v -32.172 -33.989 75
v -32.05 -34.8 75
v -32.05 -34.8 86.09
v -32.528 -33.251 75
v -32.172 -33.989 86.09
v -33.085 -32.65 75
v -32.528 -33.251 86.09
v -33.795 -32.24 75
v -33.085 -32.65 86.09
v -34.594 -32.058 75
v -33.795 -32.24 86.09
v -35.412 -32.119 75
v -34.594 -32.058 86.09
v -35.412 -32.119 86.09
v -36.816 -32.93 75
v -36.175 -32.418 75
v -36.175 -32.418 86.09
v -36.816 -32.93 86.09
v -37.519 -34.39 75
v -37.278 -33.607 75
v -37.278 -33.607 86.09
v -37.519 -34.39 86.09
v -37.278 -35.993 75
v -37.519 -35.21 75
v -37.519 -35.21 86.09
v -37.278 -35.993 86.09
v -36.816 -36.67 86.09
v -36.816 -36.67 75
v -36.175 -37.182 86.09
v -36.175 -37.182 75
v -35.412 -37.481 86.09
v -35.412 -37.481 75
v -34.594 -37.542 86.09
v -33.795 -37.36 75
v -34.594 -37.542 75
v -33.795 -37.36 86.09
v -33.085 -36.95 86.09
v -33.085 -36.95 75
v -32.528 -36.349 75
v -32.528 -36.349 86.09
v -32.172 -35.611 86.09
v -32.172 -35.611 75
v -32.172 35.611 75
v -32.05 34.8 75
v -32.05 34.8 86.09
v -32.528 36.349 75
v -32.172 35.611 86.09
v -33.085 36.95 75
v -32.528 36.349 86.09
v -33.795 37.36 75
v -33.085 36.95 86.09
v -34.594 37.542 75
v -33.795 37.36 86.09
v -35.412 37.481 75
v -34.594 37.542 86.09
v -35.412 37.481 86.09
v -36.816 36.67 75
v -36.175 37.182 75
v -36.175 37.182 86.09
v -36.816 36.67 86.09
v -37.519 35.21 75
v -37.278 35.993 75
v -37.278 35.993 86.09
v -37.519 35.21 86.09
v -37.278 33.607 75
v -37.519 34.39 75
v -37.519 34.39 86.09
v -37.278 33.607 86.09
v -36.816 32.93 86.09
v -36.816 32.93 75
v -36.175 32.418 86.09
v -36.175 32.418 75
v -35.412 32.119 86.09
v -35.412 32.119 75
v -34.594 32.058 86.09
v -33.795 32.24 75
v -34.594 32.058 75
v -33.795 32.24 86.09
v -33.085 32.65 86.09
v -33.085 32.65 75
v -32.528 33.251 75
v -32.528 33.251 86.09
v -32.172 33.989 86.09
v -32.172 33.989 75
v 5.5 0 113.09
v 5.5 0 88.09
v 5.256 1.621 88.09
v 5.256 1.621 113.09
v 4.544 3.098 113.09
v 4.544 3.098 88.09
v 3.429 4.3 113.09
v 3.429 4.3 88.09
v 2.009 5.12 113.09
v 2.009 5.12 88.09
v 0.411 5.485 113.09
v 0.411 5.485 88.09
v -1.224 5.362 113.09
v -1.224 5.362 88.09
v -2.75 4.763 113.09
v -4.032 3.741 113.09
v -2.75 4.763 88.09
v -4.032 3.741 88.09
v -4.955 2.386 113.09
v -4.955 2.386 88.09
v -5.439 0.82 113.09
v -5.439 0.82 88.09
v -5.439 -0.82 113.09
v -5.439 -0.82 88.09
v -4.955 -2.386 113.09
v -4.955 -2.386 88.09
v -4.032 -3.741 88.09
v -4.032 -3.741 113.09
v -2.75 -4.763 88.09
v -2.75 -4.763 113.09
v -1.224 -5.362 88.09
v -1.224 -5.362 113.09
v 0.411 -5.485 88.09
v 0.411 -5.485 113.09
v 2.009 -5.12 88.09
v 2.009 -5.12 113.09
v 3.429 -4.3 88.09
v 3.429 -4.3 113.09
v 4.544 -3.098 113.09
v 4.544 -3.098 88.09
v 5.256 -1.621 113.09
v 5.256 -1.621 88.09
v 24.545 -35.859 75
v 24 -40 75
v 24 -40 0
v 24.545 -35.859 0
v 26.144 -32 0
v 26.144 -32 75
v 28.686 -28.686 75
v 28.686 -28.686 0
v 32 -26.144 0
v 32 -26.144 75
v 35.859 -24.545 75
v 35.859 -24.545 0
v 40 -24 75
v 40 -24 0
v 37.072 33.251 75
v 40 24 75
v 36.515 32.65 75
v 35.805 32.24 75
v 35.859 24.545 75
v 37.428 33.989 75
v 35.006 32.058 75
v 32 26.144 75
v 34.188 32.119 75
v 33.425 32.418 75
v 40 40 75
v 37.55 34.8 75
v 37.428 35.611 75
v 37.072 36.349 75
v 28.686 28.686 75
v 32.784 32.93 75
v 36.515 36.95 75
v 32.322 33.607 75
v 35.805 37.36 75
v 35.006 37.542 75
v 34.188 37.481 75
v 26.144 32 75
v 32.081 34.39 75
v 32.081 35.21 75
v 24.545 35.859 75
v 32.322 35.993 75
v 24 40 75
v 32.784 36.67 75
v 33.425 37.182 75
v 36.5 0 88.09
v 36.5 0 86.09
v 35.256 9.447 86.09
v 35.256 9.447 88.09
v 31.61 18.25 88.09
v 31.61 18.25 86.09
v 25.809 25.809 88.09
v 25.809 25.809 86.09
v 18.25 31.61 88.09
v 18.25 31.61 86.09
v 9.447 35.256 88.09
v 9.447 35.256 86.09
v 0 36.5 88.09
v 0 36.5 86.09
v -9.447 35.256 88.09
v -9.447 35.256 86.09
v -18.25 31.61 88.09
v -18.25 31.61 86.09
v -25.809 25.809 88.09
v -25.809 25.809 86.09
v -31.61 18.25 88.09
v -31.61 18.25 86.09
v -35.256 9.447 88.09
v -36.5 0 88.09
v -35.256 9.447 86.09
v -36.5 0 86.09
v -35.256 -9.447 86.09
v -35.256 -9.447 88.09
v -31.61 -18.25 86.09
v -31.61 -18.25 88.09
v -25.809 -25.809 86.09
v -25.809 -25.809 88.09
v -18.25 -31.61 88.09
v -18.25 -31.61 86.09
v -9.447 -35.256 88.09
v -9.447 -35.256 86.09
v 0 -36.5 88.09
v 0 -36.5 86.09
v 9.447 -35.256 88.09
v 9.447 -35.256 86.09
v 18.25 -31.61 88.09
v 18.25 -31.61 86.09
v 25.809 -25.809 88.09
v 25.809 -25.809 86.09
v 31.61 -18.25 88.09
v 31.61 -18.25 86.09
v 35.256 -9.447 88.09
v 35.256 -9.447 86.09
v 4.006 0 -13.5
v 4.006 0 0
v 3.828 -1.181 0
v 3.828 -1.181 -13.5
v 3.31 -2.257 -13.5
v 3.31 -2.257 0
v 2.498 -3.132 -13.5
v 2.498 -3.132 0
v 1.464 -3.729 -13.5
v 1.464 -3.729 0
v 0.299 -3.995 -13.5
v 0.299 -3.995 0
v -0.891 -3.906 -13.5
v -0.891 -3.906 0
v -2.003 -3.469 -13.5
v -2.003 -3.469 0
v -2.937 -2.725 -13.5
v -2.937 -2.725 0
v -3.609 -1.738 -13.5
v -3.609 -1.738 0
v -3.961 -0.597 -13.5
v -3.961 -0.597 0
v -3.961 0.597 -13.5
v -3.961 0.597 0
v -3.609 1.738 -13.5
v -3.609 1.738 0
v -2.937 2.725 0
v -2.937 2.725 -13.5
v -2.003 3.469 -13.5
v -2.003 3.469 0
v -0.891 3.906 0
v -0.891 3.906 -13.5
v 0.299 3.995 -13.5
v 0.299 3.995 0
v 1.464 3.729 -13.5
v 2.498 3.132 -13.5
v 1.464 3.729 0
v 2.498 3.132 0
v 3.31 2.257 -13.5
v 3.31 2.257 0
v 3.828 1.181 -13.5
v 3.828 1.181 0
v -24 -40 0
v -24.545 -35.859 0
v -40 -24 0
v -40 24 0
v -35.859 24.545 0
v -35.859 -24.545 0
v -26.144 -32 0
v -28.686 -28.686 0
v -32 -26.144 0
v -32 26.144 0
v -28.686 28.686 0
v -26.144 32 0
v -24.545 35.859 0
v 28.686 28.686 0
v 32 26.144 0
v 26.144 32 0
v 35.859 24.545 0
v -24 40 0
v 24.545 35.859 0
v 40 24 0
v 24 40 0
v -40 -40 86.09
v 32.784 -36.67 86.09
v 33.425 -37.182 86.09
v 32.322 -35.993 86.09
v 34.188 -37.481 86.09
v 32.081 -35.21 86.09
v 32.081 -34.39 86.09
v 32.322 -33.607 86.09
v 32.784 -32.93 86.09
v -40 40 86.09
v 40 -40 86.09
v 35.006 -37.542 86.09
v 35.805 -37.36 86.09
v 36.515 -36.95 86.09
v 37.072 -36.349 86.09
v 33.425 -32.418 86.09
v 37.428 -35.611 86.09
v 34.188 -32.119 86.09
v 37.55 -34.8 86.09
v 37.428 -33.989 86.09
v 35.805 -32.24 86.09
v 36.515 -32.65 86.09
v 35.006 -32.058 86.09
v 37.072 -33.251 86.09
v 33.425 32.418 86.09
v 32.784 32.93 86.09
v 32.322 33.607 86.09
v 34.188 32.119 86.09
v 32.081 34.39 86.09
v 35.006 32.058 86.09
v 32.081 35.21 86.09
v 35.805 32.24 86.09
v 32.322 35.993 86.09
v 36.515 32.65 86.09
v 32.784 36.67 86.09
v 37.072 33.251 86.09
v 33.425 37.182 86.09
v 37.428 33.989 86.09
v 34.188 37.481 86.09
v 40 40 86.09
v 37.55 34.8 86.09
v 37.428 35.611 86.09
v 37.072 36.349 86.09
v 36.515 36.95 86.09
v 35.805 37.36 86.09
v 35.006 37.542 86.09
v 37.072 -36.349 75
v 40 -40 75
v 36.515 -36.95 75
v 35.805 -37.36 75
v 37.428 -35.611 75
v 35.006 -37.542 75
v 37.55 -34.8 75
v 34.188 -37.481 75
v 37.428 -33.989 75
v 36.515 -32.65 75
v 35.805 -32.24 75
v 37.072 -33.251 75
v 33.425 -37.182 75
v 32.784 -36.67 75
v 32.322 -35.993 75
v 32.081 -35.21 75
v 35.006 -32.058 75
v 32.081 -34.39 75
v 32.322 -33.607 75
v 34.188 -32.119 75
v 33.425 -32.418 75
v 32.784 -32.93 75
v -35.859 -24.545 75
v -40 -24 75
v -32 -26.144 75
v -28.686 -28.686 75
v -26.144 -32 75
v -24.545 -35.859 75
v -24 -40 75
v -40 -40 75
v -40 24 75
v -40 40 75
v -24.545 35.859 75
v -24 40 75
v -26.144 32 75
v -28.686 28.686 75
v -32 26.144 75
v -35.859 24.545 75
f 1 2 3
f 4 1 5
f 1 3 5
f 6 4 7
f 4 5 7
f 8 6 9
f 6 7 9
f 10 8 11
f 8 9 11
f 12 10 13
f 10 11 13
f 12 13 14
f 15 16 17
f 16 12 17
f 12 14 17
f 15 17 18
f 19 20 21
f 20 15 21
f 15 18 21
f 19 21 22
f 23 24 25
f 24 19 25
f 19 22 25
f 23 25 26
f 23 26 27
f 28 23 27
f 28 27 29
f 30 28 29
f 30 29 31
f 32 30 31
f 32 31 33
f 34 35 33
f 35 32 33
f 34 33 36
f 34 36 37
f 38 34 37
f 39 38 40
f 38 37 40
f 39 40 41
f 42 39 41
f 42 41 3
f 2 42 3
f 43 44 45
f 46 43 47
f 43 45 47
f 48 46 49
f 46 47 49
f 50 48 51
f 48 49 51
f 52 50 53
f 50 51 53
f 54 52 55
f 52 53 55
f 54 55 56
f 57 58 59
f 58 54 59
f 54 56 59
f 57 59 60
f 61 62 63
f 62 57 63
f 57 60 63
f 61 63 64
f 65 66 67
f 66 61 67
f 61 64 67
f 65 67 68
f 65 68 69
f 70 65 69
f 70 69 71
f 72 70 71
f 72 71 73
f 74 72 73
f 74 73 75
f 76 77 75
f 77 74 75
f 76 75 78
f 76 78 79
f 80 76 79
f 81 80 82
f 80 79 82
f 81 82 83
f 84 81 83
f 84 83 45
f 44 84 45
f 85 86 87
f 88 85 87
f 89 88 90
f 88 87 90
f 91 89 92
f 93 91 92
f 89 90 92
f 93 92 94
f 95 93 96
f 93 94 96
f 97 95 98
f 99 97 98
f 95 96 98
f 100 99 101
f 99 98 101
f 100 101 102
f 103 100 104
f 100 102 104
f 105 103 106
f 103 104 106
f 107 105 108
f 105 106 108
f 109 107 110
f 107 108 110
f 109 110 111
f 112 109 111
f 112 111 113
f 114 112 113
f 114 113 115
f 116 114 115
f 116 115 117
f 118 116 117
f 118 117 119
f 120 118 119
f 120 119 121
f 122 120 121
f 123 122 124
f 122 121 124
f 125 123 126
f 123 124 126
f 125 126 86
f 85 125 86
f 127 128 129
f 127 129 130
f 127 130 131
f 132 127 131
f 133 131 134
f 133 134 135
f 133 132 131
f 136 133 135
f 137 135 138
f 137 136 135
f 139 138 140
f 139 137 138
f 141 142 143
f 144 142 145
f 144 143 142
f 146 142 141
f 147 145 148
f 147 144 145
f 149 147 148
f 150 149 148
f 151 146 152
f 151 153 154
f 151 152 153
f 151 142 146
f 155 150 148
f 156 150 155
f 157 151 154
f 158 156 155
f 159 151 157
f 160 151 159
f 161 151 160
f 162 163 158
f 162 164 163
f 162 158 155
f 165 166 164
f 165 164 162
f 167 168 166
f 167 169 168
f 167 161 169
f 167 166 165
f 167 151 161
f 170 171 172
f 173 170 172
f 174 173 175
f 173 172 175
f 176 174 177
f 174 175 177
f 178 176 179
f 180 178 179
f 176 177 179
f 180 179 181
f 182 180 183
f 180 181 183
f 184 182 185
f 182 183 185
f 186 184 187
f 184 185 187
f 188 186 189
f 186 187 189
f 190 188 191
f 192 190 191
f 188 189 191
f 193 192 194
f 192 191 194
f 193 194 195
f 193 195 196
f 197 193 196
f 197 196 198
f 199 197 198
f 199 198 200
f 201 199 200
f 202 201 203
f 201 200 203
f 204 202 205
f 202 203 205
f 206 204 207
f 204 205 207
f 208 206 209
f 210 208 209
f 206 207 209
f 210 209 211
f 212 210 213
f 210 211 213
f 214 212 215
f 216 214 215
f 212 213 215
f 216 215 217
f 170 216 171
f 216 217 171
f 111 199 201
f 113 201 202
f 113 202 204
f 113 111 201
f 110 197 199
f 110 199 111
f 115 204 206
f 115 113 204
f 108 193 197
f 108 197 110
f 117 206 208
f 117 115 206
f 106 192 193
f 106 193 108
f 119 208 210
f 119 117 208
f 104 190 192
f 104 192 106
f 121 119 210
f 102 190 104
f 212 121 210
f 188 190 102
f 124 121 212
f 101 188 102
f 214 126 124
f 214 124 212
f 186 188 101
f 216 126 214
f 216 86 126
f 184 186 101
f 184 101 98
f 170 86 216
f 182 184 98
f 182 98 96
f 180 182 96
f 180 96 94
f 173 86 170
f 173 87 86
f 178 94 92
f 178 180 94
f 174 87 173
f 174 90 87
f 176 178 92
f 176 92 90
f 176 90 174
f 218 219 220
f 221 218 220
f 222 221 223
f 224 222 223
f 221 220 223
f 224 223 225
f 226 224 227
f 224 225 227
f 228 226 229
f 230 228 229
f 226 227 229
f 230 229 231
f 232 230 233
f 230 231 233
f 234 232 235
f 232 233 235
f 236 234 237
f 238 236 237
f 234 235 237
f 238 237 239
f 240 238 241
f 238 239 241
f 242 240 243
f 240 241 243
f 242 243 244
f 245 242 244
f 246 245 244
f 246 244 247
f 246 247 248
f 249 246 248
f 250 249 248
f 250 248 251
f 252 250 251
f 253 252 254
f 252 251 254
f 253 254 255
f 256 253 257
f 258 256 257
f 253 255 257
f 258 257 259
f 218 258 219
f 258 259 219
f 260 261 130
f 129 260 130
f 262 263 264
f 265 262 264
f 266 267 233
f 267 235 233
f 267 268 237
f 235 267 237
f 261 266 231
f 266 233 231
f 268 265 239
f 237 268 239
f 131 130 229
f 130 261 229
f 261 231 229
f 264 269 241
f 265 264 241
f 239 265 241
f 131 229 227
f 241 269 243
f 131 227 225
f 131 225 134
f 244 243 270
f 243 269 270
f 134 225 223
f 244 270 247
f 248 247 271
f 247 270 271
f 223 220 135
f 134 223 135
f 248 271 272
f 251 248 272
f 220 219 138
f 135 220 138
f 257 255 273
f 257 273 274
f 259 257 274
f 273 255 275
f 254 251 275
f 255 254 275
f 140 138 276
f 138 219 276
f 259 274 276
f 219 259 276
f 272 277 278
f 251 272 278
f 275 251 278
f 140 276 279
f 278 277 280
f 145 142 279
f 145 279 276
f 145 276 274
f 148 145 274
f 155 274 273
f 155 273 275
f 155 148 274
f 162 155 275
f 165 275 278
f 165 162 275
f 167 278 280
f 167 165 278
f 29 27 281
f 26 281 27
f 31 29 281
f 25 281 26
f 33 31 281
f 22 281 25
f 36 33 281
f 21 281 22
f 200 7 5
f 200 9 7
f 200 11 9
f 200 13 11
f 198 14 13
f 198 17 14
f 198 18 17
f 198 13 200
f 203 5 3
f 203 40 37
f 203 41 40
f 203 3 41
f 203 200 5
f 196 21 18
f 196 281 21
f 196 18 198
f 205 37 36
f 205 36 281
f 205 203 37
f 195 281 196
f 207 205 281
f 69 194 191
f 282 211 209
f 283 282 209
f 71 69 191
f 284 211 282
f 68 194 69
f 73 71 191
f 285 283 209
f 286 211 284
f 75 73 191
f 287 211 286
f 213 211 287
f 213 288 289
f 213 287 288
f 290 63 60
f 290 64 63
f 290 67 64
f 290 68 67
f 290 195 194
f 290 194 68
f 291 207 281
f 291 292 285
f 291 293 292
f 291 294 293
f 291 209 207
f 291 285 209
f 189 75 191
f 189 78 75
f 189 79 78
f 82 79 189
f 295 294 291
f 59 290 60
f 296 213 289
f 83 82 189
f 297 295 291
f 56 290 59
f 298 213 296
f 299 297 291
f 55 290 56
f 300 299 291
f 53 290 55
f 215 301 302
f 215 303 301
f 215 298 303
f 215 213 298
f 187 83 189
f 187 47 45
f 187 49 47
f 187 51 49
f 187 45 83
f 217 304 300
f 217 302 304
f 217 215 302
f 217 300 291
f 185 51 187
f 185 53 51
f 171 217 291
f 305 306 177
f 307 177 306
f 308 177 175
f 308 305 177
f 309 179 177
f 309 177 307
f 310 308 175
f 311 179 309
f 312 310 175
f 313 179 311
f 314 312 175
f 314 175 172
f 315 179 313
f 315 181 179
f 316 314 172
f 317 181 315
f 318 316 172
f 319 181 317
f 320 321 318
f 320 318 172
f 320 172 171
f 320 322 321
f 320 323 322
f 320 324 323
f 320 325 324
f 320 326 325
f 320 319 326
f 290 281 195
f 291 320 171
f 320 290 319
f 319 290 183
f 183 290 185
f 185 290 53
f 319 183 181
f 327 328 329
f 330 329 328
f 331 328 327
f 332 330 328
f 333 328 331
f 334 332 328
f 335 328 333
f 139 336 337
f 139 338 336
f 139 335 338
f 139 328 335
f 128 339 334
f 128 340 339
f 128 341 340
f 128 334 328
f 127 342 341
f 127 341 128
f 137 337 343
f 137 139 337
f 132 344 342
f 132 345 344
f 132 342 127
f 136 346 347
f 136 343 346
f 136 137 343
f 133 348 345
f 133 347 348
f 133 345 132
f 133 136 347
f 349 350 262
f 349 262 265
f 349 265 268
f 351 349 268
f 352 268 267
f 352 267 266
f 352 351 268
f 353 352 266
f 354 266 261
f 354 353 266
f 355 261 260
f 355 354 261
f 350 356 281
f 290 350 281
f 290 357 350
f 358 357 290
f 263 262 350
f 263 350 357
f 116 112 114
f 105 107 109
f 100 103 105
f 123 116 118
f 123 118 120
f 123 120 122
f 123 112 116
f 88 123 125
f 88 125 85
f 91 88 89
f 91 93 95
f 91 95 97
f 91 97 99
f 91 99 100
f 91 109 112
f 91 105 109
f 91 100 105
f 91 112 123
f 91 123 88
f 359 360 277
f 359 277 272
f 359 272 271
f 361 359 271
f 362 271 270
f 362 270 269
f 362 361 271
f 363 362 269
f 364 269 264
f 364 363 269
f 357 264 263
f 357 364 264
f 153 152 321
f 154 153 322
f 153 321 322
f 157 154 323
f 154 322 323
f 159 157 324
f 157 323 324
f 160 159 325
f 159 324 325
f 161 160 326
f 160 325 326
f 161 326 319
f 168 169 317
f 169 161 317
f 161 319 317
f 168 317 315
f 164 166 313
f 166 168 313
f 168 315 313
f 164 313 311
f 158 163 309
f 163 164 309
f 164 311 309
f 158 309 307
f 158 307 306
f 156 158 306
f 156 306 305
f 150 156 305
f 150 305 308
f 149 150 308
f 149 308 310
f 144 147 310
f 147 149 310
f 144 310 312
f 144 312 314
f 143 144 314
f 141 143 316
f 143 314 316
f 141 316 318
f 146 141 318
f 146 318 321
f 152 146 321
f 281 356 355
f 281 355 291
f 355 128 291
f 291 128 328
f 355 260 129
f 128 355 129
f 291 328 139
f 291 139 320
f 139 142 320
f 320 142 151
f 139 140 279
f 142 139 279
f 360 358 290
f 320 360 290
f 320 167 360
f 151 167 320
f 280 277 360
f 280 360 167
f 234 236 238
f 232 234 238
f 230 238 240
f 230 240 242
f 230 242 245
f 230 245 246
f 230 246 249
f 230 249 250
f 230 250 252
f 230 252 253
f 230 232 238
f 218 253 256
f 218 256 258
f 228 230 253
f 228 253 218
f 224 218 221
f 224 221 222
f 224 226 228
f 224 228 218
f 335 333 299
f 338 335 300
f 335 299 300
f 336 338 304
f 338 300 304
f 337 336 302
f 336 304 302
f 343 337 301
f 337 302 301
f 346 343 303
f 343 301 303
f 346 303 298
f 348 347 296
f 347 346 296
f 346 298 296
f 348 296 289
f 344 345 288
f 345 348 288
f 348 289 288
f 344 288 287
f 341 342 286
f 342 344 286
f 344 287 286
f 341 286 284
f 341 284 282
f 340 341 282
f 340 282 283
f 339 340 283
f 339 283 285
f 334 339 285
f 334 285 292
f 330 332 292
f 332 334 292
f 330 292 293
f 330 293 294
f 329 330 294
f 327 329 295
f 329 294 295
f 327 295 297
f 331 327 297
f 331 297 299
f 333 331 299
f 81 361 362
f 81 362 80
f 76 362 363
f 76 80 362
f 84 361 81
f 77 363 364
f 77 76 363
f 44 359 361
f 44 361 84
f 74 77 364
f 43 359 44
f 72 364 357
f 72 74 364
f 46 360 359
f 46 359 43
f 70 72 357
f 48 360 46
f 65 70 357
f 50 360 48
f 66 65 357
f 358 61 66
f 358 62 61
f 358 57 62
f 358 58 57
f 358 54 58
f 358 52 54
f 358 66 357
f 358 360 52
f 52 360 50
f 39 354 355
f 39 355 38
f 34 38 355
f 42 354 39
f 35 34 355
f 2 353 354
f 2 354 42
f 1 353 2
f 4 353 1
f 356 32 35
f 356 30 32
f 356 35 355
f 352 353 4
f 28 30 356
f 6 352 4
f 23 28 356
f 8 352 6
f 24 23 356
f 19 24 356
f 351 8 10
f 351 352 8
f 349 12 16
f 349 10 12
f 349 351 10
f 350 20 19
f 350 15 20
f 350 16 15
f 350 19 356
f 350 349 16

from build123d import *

# Parameters (mm, degrees)
SKETCH2_W           = 80
SKETCH2_H           = 80
BOSS_EXTRUDE1_DEPTH = 86.09
SKETCH3_R           = 2.75
CUT_EXTRUDE1_DEPTH  = 104.012077447
SKETCH4_R           = 36.5
BOSS_EXTRUDE2_DEPTH = 2
SKETCH5_R           = 5.5
BOSS_EXTRUDE3_DEPTH = 25
CUT_EXTRUDE2_START  = -75
SKETCH6_R           = 2.75
CUT_EXTRUDE2_DEPTH  = 75
SKETCH7_R           = 4.006
BOSS_EXTRUDE4_DEPTH = 13.5


with BuildPart() as part:
    # Sketch2 → Boss-Extrude1 (new body)
    with BuildSketch(Plane.XY):
        Rectangle(SKETCH2_W, SKETCH2_H)
    extrude(amount=BOSS_EXTRUDE1_DEPTH)

    # Sketch3 → Cut-Extrude1 (cut, through all)
    with BuildSketch(Plane.XY.offset(86.09)):
        with Locations((-34.8, 34.8)):
            Circle(SKETCH3_R)
        with Locations((34.8, 34.8)):
            Circle(SKETCH3_R)
        with Locations((-34.8, -34.8)):
            Circle(SKETCH3_R)
        with Locations((34.8, -34.8)):
            Circle(SKETCH3_R)
    extrude(amount=-CUT_EXTRUDE1_DEPTH, mode=Mode.SUBTRACT)

    # Sketch4 → Boss-Extrude2 (add)
    with BuildSketch(Plane.XY.offset(86.09)):
        Circle(SKETCH4_R)
    extrude(amount=BOSS_EXTRUDE2_DEPTH)

    # Sketch5 → Boss-Extrude3 (add)
    with BuildSketch(Plane.XY.offset(88.09)):
        Circle(SKETCH5_R)
    extrude(amount=BOSS_EXTRUDE3_DEPTH)

    # Sketch6 → Cut-Extrude2 (cut)
    # profile 1 of 4: a face of its own
    with BuildSketch(Plane(origin=(0, 0, 0), x_dir=(-1, 0, 0), z_dir=(0, 0, -1)).offset(CUT_EXTRUDE2_START)):
        with BuildLine():
            Line((-40, 40), (-40, 24))
            ThreePointArc((-40, 24), (-28.686291501, 28.686291501), (-24, 40))
            Line((-24, 40), (-40, 40))
        make_face()
        with Locations(Location((-34.8, 34.8, 0), (0, 0, 180))):
            Circle(SKETCH6_R, mode=Mode.SUBTRACT)
    # profile 2 of 4: a face of its own
    with BuildSketch(Plane(origin=(0, 0, 0), x_dir=(-1, 0, 0), z_dir=(0, 0, -1)).offset(CUT_EXTRUDE2_START)):
        with BuildLine():
            ThreePointArc((24, 40), (28.686291501, 28.686291501), (40, 24))
            Line((40, 24), (40, 40))
            Line((40, 40), (24, 40))
        make_face()
        with Locations(Location((34.8, 34.8, 0), (0, 0, 180))):
            Circle(SKETCH6_R, mode=Mode.SUBTRACT)
    # profile 3 of 4: a face of its own
    with BuildSketch(Plane(origin=(0, 0, 0), x_dir=(-1, 0, 0), z_dir=(0, 0, -1)).offset(CUT_EXTRUDE2_START)):
        with BuildLine():
            Line((24, -40), (40, -40))
            Line((40, -40), (40, -24))
            ThreePointArc((40, -24), (28.686291501, -28.686291501), (24, -40))
        make_face()
        with Locations(Location((34.8, -34.8, 0), (0, 0, 180))):
            Circle(SKETCH6_R, mode=Mode.SUBTRACT)
    # profile 4 of 4: a face of its own
    with BuildSketch(Plane(origin=(0, 0, 0), x_dir=(-1, 0, 0), z_dir=(0, 0, -1)).offset(CUT_EXTRUDE2_START)):
        with BuildLine():
            Line((-40, -40), (-24, -40))
            ThreePointArc((-24, -40), (-28.686291501, -28.686291501), (-40, -24))
            Line((-40, -24), (-40, -40))
        make_face()
        with Locations(Location((-34.8, -34.8, 0), (0, 0, 180))):
            Circle(SKETCH6_R, mode=Mode.SUBTRACT)
    extrude(amount=CUT_EXTRUDE2_DEPTH, mode=Mode.SUBTRACT)

    # Sketch7 → Boss-Extrude4 (add)
    with BuildSketch(Plane(origin=(0, 0, 0), x_dir=(-1, 0, 0), z_dir=(0, 0, -1))):
        with Locations(Location((0, 0, 0), (0, 0, 180))):
            Circle(SKETCH7_R)
    extrude(amount=BOSS_EXTRUDE4_DEPTH)


solid = part.part
